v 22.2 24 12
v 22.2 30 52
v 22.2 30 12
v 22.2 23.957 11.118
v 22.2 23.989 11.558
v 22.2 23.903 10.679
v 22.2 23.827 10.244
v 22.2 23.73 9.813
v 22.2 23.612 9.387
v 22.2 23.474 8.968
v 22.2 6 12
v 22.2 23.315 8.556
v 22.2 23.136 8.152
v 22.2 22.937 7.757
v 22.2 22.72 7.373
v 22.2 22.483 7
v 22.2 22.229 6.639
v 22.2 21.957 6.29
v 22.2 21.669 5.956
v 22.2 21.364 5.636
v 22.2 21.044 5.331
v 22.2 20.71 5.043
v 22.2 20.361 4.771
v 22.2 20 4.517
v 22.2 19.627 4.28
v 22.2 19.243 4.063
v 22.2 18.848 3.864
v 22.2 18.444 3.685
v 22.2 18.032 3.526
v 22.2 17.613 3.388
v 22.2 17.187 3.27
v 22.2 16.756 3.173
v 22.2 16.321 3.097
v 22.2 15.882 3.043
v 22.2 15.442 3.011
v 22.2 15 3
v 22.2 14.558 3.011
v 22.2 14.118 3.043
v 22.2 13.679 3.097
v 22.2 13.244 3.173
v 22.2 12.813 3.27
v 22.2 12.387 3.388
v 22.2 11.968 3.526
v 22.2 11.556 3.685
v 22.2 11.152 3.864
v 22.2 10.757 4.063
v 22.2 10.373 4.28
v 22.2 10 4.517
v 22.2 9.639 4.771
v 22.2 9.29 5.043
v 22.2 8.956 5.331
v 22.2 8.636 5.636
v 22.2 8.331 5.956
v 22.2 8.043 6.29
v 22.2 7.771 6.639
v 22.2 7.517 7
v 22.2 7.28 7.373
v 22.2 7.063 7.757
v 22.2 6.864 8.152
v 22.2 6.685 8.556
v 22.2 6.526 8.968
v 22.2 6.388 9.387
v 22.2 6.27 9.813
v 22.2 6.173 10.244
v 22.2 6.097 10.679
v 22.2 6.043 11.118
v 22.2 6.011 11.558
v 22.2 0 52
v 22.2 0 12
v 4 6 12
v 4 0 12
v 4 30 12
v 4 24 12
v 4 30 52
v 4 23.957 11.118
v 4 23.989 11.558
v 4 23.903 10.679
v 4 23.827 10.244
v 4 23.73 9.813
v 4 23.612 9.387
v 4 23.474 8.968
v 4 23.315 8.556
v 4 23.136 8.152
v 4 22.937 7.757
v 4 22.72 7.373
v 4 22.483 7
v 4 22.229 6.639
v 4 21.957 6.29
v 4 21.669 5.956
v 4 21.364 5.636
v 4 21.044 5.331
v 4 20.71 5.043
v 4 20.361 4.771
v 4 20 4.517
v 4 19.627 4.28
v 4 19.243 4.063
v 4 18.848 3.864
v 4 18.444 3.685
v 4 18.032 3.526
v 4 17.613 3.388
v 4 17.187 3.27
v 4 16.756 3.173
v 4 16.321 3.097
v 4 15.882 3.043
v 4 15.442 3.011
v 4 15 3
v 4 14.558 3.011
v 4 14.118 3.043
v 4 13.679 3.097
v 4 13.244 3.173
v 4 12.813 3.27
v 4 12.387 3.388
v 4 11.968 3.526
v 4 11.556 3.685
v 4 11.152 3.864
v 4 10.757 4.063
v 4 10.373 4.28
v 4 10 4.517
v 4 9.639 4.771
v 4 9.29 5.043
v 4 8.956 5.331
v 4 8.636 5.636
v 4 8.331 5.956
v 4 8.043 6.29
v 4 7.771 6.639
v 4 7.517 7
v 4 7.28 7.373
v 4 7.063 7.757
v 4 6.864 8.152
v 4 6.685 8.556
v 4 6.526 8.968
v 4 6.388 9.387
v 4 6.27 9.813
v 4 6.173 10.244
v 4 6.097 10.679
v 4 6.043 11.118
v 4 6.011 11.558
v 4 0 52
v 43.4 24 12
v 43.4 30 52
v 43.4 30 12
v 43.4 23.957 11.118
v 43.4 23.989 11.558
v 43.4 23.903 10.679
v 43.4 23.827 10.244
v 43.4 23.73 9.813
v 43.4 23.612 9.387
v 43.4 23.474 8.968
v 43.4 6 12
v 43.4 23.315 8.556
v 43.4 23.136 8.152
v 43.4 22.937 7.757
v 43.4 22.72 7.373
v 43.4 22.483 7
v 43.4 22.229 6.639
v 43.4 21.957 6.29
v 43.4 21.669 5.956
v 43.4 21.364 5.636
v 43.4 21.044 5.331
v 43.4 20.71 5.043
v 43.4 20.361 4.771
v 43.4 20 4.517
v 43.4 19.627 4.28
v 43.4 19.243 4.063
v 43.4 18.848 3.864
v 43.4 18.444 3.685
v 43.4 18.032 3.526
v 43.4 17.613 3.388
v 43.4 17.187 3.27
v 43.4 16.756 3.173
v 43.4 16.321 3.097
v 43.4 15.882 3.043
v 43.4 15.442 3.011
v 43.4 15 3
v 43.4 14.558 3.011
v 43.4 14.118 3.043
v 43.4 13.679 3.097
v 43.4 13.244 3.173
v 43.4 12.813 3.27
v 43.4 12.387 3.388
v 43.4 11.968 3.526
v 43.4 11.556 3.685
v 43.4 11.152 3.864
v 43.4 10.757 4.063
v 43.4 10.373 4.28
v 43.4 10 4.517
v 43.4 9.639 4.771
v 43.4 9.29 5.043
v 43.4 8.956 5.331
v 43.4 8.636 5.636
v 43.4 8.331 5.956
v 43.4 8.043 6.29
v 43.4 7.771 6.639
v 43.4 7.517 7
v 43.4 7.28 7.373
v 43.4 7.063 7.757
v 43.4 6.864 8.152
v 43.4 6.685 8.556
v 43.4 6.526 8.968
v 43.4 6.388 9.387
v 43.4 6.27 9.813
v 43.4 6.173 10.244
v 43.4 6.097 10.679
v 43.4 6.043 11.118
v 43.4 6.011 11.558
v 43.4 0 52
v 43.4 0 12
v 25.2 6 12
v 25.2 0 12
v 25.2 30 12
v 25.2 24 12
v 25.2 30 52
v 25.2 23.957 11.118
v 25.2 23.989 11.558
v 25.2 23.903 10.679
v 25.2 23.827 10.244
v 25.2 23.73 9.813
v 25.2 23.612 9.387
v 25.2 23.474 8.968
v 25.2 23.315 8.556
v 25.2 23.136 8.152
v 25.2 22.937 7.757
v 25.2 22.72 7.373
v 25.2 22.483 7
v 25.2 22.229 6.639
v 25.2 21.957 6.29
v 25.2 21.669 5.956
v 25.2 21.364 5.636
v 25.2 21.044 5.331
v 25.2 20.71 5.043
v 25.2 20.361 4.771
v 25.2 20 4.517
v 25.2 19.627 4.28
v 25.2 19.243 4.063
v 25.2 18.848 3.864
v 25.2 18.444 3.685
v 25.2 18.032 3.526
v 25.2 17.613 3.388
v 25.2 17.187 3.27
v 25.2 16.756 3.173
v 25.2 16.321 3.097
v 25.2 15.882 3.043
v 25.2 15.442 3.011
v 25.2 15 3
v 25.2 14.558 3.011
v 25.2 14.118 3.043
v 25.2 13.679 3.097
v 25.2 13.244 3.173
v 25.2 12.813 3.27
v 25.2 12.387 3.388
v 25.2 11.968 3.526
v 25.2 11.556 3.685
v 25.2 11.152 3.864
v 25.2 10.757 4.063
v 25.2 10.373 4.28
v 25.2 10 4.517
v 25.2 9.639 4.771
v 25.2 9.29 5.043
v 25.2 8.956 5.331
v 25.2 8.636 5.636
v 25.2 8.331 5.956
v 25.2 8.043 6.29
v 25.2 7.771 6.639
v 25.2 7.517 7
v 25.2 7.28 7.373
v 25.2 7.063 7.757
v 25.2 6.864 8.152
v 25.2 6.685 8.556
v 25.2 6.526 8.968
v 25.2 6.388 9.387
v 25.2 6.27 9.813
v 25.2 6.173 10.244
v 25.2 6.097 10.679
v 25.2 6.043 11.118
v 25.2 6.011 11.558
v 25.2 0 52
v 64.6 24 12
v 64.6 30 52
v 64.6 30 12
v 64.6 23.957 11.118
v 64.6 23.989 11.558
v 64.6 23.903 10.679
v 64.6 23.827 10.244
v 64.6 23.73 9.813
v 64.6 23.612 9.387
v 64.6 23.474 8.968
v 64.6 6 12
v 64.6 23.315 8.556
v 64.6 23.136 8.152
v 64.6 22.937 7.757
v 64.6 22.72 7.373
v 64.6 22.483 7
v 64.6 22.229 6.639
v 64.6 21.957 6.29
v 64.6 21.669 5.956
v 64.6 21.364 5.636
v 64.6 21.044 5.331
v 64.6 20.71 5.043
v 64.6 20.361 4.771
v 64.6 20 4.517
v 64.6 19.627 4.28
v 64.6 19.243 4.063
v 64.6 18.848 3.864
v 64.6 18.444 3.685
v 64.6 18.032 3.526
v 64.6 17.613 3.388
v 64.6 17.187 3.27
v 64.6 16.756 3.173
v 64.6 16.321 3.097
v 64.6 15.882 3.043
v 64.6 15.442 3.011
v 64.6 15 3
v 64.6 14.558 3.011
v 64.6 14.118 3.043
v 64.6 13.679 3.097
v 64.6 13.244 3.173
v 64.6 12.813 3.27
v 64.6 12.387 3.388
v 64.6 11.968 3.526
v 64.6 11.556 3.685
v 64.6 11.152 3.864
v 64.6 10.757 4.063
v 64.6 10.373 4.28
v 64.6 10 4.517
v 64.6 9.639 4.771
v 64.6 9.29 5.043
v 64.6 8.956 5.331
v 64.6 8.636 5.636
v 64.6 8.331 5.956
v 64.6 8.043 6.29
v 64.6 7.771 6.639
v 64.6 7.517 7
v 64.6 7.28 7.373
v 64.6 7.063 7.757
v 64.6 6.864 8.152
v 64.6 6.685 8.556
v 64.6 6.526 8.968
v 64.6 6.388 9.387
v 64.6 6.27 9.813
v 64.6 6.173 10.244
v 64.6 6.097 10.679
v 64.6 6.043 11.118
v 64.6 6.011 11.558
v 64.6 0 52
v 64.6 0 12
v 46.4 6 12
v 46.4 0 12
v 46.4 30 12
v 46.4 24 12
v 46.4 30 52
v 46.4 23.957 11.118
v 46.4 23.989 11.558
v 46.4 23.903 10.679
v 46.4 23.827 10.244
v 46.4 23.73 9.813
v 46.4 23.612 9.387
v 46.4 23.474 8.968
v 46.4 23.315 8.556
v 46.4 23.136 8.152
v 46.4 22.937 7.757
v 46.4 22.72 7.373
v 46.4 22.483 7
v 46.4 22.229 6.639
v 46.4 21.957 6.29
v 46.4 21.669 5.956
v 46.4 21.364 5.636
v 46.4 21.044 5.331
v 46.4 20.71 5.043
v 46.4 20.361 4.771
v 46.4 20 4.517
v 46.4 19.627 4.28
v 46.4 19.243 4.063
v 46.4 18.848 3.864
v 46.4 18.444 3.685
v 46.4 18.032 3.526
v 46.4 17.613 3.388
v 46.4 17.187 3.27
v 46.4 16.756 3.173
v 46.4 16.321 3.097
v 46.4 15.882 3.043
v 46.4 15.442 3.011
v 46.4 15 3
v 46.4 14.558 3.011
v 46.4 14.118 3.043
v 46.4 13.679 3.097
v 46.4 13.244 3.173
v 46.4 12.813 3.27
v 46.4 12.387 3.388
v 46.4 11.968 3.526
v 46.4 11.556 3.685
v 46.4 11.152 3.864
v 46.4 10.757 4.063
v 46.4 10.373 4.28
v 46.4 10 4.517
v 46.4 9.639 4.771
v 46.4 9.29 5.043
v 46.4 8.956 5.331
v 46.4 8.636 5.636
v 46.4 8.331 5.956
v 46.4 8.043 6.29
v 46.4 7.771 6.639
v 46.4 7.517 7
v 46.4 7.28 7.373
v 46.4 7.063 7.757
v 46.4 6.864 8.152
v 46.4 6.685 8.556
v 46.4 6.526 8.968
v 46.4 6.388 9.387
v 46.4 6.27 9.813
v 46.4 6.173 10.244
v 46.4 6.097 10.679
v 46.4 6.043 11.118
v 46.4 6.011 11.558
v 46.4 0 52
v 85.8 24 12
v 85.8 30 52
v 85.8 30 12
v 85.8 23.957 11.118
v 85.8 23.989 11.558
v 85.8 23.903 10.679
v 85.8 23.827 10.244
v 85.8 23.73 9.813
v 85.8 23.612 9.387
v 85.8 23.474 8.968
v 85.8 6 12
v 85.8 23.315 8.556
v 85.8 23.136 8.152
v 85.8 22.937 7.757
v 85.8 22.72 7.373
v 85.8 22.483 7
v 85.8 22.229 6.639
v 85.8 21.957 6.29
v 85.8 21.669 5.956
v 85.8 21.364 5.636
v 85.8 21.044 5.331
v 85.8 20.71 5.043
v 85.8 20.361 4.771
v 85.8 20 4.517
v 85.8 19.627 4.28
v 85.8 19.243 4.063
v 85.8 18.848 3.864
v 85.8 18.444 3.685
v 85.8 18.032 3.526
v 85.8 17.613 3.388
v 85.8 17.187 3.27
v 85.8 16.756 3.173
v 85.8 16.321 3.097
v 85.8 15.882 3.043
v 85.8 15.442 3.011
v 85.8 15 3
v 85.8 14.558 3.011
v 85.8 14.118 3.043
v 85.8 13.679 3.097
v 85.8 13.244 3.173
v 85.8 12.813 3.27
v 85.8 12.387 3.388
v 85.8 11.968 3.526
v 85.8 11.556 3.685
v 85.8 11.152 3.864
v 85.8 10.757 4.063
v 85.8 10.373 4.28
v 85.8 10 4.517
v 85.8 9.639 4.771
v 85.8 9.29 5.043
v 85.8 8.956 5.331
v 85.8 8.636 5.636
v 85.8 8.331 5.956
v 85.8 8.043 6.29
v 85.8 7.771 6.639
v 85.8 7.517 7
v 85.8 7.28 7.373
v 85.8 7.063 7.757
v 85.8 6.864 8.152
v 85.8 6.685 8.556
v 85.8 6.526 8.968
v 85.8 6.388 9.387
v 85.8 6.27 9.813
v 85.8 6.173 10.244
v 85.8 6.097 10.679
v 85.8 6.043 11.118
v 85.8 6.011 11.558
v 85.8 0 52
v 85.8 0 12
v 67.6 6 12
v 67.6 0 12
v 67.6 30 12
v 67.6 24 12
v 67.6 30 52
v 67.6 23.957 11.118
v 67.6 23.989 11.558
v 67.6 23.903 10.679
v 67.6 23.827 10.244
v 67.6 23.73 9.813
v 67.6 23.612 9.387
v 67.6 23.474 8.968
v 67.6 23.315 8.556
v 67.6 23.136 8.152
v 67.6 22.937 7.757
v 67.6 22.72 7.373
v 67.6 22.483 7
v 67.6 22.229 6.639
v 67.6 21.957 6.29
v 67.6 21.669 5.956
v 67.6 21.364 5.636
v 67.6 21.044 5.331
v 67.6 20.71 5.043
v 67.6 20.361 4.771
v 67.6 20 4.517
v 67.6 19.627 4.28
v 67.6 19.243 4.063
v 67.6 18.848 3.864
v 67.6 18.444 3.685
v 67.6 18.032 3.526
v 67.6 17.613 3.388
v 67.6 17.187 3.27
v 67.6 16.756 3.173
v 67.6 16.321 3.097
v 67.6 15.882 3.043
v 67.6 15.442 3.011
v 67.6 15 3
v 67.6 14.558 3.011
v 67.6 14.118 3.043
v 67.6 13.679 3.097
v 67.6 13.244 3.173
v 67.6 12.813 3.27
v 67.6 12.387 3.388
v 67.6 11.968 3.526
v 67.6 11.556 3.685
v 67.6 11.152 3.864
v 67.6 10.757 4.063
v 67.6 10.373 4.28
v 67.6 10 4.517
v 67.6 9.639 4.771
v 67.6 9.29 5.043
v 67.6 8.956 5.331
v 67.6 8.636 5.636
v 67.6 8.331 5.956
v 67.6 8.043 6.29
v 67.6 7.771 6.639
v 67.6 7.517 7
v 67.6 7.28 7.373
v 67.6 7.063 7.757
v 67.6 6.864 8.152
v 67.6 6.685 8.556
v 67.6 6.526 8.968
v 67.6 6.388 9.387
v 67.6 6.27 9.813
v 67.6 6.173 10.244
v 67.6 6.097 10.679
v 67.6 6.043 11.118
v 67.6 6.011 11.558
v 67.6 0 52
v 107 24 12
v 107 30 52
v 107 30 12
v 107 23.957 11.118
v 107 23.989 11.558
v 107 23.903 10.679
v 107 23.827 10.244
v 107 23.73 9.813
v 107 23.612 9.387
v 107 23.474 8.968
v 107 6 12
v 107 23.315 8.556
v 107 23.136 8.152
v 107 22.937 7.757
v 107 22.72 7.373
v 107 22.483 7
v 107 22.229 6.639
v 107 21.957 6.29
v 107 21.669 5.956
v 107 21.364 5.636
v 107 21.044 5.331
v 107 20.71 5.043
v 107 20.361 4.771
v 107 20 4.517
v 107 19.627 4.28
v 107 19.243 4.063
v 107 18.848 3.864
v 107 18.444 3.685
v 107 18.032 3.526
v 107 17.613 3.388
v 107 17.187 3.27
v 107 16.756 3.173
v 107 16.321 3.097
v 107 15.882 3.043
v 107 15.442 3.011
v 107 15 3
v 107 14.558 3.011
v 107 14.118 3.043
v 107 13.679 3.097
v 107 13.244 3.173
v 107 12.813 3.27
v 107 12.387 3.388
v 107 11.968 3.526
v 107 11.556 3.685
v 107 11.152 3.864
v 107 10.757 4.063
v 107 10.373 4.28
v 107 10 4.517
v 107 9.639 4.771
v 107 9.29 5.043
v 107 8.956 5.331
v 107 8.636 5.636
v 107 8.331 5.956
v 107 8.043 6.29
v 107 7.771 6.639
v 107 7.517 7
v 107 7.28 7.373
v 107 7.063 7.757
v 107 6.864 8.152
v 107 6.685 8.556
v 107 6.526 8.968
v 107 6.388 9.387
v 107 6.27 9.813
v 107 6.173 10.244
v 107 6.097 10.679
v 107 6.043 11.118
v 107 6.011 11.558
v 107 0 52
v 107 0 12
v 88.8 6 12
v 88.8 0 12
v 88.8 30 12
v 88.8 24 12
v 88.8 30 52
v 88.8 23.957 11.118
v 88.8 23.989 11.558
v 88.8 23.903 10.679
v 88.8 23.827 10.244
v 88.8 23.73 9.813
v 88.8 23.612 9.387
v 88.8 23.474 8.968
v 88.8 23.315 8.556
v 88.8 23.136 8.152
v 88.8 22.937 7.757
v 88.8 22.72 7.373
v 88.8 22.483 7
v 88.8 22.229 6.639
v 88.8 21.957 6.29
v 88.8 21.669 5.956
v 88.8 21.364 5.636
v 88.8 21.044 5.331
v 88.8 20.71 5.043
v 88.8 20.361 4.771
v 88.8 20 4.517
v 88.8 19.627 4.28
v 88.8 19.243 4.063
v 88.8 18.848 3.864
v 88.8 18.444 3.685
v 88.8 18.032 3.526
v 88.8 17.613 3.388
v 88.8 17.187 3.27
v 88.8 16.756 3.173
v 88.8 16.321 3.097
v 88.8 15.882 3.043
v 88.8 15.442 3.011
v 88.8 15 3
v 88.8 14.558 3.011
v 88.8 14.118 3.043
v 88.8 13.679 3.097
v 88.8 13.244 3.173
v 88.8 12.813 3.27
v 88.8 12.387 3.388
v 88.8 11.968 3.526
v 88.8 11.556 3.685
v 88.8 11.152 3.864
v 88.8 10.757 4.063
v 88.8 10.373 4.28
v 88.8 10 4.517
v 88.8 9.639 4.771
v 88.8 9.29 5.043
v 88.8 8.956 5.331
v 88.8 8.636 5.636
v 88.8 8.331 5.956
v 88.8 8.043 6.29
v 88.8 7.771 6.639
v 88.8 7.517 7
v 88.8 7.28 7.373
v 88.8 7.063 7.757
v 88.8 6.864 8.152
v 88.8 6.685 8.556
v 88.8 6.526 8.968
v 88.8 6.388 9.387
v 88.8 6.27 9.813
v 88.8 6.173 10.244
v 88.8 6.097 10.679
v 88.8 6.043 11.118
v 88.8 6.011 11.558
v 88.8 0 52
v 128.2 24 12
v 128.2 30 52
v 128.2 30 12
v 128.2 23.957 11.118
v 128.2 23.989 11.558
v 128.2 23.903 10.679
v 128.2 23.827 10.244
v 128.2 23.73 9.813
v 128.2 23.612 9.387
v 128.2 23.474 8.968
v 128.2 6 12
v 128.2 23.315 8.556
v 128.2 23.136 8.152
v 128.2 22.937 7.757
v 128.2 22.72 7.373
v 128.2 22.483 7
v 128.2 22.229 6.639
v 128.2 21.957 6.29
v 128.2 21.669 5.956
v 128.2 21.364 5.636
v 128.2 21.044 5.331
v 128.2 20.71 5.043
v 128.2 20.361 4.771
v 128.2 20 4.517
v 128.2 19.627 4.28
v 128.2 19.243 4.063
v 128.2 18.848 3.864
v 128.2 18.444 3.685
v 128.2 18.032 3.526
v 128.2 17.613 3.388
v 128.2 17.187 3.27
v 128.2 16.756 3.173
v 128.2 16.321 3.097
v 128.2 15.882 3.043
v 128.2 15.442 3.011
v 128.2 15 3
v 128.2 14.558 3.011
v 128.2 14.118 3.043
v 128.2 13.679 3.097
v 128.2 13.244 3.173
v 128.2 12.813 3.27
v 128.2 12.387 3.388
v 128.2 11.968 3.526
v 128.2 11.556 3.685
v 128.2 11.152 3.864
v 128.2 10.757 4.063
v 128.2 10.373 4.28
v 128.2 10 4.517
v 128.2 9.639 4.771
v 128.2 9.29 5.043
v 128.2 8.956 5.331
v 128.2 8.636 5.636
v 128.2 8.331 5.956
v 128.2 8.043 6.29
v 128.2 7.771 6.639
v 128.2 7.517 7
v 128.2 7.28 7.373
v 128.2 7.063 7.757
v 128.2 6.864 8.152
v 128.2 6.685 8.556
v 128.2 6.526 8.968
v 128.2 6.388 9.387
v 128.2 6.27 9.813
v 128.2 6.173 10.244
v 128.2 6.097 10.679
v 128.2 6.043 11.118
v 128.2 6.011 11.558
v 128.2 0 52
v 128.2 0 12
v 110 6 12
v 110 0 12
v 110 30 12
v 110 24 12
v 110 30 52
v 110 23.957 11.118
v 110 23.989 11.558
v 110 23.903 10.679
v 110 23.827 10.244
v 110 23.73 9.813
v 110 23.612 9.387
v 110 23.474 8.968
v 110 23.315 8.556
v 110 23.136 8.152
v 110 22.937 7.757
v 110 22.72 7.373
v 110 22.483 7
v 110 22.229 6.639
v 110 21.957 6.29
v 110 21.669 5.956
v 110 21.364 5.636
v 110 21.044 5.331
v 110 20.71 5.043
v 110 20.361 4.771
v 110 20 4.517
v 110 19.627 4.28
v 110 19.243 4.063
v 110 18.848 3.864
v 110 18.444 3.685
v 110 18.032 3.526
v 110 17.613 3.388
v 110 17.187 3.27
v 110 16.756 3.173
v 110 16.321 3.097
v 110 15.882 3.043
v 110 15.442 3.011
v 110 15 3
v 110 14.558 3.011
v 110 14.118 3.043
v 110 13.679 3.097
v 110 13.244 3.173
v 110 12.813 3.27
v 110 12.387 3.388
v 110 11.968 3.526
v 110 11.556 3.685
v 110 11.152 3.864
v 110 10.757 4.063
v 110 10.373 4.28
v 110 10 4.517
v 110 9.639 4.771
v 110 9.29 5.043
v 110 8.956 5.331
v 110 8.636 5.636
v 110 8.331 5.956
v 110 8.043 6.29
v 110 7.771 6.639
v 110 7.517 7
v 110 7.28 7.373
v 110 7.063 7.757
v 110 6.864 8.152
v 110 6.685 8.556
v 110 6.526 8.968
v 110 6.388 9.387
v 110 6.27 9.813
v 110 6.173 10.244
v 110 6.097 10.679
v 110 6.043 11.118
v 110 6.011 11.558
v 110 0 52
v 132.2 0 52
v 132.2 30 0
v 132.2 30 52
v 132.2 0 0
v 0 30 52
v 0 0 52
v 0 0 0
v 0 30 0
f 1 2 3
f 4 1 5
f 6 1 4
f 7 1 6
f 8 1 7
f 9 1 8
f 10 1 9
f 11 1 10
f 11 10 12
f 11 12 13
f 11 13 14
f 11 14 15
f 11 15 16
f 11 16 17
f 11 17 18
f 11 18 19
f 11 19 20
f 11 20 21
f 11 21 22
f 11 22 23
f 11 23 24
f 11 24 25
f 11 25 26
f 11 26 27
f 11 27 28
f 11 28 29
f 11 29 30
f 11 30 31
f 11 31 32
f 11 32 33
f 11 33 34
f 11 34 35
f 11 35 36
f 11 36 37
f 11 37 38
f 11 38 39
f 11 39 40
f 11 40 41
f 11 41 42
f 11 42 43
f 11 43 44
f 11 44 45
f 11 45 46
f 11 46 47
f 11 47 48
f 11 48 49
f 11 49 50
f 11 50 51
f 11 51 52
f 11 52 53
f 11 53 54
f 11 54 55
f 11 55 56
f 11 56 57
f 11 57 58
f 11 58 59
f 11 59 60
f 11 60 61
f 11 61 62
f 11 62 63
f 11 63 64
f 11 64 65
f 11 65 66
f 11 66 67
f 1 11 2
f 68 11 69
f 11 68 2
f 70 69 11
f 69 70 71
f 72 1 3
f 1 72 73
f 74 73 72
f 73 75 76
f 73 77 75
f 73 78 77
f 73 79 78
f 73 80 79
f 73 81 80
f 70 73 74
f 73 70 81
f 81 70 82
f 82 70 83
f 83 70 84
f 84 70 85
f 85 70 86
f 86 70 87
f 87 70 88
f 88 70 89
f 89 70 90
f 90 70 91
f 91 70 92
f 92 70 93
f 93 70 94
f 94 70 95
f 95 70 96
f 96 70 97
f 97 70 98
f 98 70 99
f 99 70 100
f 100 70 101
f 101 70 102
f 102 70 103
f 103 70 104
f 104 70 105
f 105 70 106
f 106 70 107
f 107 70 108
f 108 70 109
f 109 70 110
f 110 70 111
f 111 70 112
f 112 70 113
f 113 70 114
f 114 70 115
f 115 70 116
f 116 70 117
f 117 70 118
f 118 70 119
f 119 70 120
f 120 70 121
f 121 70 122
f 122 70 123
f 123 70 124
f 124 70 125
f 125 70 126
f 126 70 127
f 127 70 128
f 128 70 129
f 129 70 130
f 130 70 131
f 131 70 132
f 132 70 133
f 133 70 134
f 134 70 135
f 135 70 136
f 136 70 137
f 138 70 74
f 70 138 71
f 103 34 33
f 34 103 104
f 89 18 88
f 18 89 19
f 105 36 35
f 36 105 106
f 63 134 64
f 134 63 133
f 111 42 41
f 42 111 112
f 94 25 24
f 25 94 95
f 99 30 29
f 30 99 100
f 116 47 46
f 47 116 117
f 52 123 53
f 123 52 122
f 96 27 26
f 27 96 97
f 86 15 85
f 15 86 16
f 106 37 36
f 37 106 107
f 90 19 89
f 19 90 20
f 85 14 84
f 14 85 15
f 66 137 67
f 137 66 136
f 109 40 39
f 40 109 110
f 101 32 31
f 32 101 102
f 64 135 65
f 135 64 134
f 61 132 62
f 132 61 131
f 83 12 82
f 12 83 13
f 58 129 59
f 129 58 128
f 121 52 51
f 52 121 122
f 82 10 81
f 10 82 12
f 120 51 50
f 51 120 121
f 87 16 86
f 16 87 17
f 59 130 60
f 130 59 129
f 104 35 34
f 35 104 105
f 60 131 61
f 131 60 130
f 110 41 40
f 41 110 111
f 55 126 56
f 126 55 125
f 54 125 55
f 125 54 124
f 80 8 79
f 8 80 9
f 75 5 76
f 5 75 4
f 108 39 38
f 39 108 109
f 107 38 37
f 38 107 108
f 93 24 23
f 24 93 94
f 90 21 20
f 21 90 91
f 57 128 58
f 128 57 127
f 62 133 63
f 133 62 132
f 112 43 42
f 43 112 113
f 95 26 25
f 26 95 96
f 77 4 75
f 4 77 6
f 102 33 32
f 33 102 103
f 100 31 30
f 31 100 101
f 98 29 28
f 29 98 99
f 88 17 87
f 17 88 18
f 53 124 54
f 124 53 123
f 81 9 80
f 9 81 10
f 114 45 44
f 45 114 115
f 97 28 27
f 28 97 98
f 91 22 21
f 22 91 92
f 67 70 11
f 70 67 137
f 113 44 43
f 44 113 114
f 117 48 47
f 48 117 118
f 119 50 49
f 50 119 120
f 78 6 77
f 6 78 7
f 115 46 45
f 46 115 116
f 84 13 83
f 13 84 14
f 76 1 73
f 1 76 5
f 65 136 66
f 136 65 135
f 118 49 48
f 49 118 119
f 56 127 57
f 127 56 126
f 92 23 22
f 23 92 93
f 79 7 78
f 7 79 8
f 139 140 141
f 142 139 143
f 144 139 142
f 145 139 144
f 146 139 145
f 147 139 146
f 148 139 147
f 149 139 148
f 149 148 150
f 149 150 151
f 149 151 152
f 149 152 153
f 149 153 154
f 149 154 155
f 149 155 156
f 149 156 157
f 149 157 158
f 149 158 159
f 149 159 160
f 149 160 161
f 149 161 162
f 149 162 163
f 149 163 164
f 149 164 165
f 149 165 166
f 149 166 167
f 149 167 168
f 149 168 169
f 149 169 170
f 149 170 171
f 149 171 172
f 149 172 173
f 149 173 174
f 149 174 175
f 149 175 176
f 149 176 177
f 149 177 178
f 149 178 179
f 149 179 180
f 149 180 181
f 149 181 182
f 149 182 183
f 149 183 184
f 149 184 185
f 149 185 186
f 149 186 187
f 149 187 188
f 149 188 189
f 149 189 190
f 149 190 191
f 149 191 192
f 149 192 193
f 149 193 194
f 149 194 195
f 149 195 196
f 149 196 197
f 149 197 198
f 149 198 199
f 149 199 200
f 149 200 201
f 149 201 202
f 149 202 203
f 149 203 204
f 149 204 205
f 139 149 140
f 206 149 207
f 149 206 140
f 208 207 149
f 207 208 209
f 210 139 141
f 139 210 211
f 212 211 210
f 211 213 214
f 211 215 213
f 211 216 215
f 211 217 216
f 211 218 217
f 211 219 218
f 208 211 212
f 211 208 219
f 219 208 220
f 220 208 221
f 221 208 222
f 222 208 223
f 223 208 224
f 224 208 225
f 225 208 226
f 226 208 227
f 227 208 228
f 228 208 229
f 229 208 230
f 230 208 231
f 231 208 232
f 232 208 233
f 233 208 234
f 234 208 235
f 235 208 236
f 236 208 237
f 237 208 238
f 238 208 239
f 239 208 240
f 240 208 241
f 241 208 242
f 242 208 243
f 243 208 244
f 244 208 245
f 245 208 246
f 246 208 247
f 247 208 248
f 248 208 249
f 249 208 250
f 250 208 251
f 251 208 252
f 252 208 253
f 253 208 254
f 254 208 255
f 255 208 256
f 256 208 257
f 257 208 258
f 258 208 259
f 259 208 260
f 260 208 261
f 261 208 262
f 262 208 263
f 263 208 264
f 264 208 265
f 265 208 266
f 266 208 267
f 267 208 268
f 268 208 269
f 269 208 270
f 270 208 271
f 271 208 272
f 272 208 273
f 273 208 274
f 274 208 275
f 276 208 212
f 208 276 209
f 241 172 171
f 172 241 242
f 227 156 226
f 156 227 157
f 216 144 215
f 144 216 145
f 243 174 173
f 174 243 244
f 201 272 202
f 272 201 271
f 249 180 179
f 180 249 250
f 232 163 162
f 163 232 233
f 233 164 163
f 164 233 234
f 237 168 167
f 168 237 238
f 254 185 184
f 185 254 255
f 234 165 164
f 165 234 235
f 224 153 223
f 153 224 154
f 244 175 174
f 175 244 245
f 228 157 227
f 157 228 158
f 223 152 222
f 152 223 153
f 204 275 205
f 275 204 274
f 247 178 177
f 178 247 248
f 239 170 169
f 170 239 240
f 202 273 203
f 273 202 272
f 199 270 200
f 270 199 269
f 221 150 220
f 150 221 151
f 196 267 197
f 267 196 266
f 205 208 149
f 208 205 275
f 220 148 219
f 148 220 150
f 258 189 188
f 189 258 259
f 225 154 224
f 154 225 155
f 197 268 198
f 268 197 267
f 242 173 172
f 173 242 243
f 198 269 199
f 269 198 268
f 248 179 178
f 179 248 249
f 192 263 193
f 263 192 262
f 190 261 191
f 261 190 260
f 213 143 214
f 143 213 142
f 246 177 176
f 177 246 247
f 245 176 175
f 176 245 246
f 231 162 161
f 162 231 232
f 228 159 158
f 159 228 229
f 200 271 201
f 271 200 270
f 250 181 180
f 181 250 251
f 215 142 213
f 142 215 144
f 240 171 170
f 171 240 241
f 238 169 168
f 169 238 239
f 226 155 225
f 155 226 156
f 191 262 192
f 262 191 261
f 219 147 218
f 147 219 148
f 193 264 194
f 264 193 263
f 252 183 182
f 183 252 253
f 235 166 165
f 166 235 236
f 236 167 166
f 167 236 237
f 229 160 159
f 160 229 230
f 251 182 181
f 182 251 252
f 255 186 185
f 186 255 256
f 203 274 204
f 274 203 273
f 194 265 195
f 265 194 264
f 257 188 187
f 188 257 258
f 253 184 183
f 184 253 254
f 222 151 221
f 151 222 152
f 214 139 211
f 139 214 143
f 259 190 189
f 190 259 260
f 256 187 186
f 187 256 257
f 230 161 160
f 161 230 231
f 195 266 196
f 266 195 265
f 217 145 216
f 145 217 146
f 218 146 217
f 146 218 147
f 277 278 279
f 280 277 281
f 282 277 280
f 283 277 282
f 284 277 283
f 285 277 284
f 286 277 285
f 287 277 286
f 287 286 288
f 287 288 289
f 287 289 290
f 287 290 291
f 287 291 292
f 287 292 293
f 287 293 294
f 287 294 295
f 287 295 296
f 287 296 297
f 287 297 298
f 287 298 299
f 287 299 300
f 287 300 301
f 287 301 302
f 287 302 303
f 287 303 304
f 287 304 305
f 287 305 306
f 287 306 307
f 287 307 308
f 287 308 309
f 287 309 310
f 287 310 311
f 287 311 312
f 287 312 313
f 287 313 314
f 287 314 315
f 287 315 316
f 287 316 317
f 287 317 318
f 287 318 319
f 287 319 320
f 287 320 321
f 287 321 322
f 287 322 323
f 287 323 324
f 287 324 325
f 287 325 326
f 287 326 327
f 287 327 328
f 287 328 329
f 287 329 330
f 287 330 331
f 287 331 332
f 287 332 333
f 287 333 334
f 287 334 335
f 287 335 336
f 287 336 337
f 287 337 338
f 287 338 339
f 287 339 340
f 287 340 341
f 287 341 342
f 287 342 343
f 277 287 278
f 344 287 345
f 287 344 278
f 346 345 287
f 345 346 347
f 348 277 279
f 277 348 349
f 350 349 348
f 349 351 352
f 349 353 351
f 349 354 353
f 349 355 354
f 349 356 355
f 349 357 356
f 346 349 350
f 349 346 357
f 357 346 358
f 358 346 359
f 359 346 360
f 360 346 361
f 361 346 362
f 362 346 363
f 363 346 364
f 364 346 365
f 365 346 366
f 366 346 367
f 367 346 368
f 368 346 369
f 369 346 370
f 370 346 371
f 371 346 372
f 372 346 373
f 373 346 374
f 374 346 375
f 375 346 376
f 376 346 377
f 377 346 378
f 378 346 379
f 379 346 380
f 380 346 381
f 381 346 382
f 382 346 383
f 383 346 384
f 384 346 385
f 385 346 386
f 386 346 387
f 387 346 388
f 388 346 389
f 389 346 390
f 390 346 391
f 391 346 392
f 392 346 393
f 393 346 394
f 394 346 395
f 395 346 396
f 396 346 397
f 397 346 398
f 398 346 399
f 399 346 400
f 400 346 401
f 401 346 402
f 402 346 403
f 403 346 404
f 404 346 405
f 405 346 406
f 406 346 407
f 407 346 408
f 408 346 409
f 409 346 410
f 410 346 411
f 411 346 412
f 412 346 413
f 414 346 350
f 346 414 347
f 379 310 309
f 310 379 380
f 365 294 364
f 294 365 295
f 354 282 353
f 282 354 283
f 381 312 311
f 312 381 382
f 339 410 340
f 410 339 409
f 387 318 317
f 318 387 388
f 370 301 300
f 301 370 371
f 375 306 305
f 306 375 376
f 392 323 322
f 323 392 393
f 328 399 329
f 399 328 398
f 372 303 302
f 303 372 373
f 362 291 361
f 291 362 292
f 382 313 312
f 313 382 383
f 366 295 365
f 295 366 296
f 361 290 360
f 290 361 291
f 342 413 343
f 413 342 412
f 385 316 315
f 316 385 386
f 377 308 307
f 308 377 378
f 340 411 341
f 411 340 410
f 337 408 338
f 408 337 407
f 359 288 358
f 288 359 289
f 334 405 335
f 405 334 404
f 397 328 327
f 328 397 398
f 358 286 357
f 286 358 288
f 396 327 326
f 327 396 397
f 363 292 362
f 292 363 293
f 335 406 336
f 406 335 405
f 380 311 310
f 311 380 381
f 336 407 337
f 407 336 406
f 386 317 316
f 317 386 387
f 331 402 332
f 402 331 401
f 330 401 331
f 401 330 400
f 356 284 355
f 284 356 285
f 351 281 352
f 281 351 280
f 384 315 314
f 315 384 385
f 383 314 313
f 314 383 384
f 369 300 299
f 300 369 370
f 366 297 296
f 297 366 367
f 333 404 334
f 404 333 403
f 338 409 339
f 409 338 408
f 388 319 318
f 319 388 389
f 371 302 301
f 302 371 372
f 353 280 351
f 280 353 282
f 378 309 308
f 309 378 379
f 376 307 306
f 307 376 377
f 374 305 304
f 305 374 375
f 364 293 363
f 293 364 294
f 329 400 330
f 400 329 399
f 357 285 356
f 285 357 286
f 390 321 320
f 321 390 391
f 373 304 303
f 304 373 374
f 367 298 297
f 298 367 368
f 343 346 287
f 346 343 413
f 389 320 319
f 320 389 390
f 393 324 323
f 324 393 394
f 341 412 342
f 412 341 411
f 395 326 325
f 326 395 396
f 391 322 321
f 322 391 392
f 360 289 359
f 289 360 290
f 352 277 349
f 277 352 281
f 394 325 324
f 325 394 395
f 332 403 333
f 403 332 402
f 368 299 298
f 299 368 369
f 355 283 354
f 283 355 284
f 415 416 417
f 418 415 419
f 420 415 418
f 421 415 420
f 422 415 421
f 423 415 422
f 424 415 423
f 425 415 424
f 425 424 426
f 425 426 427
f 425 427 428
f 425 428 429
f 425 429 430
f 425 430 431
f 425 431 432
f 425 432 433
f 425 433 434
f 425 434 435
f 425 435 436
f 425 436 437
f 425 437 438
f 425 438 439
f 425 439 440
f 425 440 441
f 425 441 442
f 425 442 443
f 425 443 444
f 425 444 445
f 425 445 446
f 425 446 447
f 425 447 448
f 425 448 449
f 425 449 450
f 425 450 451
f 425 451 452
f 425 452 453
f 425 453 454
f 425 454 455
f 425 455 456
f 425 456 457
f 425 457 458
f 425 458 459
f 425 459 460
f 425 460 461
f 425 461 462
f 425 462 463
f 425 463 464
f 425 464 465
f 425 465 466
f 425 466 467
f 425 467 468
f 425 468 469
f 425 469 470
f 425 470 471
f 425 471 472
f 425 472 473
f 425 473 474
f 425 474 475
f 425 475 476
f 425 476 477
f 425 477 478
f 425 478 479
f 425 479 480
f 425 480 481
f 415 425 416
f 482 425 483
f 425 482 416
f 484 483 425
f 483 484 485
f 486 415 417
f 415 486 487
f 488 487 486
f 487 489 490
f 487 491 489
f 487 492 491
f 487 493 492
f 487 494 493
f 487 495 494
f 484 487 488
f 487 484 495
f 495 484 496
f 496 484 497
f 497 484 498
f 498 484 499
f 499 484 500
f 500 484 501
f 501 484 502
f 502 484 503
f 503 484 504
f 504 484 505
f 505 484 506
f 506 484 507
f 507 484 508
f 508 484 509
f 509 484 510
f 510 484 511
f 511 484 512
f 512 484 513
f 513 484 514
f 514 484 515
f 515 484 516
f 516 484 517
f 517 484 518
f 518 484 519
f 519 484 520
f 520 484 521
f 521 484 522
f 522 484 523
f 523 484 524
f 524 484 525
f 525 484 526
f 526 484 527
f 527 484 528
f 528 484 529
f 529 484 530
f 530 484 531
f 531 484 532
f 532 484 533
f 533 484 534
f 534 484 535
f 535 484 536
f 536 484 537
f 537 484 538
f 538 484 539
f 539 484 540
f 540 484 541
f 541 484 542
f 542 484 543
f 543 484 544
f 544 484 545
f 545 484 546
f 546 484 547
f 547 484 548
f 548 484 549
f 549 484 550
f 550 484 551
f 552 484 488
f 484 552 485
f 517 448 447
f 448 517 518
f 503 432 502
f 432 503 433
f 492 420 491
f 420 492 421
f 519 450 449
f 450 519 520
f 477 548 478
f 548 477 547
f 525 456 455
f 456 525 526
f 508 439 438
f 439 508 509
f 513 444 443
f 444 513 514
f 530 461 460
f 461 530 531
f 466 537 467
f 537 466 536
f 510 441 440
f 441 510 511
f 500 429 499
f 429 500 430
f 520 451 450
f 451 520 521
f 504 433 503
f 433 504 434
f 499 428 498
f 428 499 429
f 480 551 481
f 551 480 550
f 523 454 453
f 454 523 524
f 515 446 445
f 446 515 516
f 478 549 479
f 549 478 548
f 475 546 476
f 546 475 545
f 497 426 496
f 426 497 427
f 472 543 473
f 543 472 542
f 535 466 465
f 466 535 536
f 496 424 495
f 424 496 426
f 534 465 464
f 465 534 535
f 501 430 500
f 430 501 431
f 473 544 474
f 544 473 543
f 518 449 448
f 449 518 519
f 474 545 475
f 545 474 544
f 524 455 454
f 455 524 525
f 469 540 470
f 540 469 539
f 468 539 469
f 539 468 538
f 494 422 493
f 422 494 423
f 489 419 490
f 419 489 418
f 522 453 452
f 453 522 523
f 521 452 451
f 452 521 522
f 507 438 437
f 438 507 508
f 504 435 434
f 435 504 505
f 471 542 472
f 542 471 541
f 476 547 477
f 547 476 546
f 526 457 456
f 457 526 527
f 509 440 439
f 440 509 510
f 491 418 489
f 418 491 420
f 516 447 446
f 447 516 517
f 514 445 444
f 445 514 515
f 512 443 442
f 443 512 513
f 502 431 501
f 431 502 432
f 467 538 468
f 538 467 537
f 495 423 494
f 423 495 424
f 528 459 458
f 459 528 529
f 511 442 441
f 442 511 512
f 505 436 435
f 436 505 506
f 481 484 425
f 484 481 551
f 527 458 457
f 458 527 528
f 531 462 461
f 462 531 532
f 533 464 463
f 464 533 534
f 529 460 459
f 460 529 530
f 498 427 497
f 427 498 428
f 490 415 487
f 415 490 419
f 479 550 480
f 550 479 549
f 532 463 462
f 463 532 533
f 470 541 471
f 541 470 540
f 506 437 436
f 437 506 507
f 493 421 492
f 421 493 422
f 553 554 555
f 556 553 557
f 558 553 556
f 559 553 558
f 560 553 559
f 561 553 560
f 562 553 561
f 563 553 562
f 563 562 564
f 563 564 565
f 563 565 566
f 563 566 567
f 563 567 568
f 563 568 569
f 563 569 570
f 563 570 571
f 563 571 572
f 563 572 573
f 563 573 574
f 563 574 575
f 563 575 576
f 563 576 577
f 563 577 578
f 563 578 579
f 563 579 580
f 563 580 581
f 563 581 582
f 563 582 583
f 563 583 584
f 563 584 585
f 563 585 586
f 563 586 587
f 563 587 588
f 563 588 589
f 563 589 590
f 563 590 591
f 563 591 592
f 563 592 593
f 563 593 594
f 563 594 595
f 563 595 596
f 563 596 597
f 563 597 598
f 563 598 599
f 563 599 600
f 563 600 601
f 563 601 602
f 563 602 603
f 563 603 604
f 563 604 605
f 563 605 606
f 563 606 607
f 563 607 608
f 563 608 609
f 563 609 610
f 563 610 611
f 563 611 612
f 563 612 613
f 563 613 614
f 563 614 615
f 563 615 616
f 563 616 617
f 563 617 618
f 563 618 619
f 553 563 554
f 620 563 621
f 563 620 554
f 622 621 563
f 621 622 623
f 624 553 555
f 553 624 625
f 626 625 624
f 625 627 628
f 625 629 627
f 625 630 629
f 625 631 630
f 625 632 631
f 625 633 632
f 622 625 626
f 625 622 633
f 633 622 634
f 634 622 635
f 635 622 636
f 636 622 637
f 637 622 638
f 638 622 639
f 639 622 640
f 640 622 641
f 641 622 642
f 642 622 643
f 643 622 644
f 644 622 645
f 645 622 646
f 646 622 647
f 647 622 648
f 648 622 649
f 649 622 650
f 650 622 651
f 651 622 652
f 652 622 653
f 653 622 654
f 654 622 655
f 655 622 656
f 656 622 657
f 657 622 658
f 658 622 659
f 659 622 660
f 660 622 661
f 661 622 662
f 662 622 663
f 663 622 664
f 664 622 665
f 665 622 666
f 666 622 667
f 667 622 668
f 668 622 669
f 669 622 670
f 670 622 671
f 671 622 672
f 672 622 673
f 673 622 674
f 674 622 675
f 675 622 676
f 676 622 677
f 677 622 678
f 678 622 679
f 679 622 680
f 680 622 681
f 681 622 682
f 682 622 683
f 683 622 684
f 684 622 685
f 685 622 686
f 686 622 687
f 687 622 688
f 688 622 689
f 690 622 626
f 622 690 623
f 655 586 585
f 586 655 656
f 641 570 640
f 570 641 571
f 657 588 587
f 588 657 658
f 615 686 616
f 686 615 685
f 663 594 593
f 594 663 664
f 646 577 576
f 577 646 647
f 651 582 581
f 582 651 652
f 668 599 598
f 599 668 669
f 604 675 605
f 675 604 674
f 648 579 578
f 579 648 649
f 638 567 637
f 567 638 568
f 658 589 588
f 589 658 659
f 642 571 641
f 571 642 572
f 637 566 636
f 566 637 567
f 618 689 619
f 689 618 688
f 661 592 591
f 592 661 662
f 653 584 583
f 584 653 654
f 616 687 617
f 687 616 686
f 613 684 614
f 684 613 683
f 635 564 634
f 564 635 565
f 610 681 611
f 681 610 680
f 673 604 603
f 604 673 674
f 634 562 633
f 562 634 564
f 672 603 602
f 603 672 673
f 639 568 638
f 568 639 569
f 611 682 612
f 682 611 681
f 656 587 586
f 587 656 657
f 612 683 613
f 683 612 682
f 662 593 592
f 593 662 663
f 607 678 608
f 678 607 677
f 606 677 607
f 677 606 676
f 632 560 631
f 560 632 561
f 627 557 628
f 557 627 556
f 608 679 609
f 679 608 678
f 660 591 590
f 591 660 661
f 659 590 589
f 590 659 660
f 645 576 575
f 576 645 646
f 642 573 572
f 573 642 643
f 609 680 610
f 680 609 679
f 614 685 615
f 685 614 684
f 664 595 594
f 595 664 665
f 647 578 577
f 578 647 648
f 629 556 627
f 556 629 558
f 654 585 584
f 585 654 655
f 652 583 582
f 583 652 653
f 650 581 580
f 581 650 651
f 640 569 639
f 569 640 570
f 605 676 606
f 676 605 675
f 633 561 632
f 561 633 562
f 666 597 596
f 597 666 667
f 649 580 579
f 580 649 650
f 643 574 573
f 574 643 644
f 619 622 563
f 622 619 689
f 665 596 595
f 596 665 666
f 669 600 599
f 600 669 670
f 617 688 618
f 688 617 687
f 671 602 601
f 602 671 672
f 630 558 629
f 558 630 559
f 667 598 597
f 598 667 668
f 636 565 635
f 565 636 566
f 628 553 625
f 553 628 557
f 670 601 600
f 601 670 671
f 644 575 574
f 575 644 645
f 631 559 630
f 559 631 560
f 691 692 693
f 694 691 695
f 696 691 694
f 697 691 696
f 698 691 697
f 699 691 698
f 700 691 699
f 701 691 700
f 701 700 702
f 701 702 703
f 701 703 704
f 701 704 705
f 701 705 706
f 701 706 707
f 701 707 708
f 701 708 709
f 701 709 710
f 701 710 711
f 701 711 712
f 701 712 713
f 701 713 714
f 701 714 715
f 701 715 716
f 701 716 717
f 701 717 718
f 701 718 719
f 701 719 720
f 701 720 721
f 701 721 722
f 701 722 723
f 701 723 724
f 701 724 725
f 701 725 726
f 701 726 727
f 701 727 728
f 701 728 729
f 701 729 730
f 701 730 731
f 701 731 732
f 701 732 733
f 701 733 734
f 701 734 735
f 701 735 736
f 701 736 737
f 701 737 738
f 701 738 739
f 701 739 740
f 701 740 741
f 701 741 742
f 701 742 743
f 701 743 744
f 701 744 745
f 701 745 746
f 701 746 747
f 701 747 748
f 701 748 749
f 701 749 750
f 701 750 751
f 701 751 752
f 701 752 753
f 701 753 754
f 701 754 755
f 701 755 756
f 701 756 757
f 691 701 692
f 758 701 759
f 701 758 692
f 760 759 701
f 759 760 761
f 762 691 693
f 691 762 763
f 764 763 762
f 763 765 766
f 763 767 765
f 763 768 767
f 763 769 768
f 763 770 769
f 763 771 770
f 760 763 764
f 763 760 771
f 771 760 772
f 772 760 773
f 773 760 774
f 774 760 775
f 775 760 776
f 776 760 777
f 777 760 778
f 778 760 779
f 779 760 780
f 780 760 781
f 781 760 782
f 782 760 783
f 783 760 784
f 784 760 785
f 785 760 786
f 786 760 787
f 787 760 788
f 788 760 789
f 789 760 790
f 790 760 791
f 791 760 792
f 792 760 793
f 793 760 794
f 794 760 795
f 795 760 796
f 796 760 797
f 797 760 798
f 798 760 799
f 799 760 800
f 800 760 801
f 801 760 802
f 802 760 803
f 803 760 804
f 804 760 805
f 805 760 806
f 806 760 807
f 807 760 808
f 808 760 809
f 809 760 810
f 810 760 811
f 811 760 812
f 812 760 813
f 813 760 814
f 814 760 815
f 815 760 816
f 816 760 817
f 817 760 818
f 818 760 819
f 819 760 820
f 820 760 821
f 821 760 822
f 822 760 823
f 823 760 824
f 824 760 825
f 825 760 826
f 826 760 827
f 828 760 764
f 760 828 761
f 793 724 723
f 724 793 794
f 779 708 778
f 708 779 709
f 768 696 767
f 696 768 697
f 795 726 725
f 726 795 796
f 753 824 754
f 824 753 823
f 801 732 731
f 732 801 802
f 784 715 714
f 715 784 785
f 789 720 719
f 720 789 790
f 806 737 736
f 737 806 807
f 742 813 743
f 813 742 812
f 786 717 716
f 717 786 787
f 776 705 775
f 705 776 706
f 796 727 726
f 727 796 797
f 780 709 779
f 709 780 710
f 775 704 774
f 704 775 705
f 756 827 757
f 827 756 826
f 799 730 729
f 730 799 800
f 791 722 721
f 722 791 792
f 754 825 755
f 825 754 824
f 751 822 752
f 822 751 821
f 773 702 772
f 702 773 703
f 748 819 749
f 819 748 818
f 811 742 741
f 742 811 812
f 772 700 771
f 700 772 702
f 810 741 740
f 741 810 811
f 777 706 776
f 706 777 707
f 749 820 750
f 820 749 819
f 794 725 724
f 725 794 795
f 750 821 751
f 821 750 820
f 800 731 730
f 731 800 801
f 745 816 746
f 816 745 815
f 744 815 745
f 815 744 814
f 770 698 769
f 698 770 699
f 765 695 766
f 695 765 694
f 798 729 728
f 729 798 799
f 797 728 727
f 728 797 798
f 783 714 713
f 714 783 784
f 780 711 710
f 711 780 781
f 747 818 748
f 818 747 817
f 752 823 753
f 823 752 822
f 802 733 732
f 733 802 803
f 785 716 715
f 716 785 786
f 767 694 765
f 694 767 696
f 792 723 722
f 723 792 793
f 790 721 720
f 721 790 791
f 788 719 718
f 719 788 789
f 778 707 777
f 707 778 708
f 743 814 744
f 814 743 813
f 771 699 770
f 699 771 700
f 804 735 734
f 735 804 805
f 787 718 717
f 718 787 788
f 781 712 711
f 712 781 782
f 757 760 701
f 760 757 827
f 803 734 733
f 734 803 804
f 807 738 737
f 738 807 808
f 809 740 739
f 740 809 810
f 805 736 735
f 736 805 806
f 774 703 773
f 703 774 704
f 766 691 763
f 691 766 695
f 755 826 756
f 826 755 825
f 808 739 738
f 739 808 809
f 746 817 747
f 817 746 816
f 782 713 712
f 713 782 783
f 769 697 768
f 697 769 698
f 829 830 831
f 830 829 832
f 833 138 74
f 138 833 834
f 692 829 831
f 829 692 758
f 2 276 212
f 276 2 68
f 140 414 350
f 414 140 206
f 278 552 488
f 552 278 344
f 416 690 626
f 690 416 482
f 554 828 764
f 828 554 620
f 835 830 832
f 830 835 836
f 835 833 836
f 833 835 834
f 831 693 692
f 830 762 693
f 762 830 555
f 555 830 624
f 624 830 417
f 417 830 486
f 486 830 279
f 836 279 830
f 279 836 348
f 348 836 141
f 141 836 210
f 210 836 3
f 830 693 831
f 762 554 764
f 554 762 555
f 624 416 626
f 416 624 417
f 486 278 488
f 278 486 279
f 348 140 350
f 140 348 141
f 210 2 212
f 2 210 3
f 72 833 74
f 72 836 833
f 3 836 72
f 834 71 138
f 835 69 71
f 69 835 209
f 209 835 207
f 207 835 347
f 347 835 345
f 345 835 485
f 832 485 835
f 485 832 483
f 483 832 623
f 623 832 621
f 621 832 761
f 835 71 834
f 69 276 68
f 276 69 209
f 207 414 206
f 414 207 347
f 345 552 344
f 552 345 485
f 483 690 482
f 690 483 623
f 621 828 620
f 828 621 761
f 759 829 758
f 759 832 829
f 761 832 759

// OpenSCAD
// file: ../../common/utils.scad
// Common utilities and shared variables
// Include this file at the top of your models:
//   include <../../common/utils.scad>

// ── Units ────────────────────────────────────────────────────────────────────
// All dimensions in millimeters

// ── Print tolerances ─────────────────────────────────────────────────────────
// Gap to add when two parts need to fit together (e.g., peg into a hole)
FIT_CLEARANCE = 0.2;  // mm

// Tolerance for press-fit / tight connections
PRESS_FIT = 0.1;  // mm

// ── Quality settings ─────────────────────────────────────────────────────────
// Override per-model if needed
$fn = $preview ? 32 : 128;  // Circle/sphere resolution

// ── Common layer heights ──────────────────────────────────────────────────────
LAYER_HEIGHT      = 0.2;   // standard
FIRST_LAYER       = 0.3;   // slightly thicker first layer
MIN_WALL          = 0.4;   // single extrusion width (0.4 mm nozzle)
// main file
// Water bottle lid rack — kitchen cabinet organiser
// Holds wide-mouth lids (Nalgene / Hydro Flask style) standing on edge,
// dish-rack style.  Slots are open front AND back; a cylindrical cradle
// groove at the base of each slot keeps the round lid rim from rolling.
//
// Usage:
//   openscad -o lid-rack.stl lid-rack.scad
//   openscad -D "n_lids=4" -o lid-rack-4.stl lid-rack.scad

include <../../common/utils.scad>

// ── Parameters ────────────────────────────────────────────────────────────────

lid_od        = 63;   // wide-mouth lid outer diameter (mm)
lid_thickness = 18;   // lid body thickness — adjust for your lids (mm)
n_lids        =  6;   // number of lid slots
slot_h        = 40;   // slot wall height above the base (lids protrude above) (mm)
wall          =  4;   // outer side-wall thickness (mm)
divider_t     =  3;   // divider fin thickness (mm)
base_h        = 12;   // floor thickness; must exceed cradle_r (mm)
rack_depth    = 30;   // front-to-back depth of the rack (mm)
cradle_r      =  9;   // cradle groove radius — curves the floor so lids don't roll (mm)

// ── Derived ───────────────────────────────────────────────────────────────────

slot_w  = lid_thickness + FIT_CLEARANCE;
total_w = 2 * wall + n_lids * slot_w + (n_lids - 1) * divider_t;
total_d = rack_depth;
total_h = base_h + slot_h;

// ── Model ─────────────────────────────────────────────────────────────────────

difference() {
    // Solid block
    cube([total_w, total_d, total_h]);

    for (i = [0 : n_lids - 1]) {
        slot_x = wall + i * (slot_w + divider_t);

        // Open vertical slot — open on both front and back faces
        translate([slot_x, -1, base_h])
            cube([slot_w, total_d + 2, slot_h + 1]);

        // Cradle groove: cylindrical scoop at the floor of each slot.
        // Axis runs along X (slot-width direction); the arc in the Y-Z plane
        // cradles the circular lid rim and prevents it from rolling.
        translate([slot_x, total_d / 2, base_h])
            rotate([0, 90, 0])
                cylinder(h = slot_w, r = cradle_r);
    }
}
